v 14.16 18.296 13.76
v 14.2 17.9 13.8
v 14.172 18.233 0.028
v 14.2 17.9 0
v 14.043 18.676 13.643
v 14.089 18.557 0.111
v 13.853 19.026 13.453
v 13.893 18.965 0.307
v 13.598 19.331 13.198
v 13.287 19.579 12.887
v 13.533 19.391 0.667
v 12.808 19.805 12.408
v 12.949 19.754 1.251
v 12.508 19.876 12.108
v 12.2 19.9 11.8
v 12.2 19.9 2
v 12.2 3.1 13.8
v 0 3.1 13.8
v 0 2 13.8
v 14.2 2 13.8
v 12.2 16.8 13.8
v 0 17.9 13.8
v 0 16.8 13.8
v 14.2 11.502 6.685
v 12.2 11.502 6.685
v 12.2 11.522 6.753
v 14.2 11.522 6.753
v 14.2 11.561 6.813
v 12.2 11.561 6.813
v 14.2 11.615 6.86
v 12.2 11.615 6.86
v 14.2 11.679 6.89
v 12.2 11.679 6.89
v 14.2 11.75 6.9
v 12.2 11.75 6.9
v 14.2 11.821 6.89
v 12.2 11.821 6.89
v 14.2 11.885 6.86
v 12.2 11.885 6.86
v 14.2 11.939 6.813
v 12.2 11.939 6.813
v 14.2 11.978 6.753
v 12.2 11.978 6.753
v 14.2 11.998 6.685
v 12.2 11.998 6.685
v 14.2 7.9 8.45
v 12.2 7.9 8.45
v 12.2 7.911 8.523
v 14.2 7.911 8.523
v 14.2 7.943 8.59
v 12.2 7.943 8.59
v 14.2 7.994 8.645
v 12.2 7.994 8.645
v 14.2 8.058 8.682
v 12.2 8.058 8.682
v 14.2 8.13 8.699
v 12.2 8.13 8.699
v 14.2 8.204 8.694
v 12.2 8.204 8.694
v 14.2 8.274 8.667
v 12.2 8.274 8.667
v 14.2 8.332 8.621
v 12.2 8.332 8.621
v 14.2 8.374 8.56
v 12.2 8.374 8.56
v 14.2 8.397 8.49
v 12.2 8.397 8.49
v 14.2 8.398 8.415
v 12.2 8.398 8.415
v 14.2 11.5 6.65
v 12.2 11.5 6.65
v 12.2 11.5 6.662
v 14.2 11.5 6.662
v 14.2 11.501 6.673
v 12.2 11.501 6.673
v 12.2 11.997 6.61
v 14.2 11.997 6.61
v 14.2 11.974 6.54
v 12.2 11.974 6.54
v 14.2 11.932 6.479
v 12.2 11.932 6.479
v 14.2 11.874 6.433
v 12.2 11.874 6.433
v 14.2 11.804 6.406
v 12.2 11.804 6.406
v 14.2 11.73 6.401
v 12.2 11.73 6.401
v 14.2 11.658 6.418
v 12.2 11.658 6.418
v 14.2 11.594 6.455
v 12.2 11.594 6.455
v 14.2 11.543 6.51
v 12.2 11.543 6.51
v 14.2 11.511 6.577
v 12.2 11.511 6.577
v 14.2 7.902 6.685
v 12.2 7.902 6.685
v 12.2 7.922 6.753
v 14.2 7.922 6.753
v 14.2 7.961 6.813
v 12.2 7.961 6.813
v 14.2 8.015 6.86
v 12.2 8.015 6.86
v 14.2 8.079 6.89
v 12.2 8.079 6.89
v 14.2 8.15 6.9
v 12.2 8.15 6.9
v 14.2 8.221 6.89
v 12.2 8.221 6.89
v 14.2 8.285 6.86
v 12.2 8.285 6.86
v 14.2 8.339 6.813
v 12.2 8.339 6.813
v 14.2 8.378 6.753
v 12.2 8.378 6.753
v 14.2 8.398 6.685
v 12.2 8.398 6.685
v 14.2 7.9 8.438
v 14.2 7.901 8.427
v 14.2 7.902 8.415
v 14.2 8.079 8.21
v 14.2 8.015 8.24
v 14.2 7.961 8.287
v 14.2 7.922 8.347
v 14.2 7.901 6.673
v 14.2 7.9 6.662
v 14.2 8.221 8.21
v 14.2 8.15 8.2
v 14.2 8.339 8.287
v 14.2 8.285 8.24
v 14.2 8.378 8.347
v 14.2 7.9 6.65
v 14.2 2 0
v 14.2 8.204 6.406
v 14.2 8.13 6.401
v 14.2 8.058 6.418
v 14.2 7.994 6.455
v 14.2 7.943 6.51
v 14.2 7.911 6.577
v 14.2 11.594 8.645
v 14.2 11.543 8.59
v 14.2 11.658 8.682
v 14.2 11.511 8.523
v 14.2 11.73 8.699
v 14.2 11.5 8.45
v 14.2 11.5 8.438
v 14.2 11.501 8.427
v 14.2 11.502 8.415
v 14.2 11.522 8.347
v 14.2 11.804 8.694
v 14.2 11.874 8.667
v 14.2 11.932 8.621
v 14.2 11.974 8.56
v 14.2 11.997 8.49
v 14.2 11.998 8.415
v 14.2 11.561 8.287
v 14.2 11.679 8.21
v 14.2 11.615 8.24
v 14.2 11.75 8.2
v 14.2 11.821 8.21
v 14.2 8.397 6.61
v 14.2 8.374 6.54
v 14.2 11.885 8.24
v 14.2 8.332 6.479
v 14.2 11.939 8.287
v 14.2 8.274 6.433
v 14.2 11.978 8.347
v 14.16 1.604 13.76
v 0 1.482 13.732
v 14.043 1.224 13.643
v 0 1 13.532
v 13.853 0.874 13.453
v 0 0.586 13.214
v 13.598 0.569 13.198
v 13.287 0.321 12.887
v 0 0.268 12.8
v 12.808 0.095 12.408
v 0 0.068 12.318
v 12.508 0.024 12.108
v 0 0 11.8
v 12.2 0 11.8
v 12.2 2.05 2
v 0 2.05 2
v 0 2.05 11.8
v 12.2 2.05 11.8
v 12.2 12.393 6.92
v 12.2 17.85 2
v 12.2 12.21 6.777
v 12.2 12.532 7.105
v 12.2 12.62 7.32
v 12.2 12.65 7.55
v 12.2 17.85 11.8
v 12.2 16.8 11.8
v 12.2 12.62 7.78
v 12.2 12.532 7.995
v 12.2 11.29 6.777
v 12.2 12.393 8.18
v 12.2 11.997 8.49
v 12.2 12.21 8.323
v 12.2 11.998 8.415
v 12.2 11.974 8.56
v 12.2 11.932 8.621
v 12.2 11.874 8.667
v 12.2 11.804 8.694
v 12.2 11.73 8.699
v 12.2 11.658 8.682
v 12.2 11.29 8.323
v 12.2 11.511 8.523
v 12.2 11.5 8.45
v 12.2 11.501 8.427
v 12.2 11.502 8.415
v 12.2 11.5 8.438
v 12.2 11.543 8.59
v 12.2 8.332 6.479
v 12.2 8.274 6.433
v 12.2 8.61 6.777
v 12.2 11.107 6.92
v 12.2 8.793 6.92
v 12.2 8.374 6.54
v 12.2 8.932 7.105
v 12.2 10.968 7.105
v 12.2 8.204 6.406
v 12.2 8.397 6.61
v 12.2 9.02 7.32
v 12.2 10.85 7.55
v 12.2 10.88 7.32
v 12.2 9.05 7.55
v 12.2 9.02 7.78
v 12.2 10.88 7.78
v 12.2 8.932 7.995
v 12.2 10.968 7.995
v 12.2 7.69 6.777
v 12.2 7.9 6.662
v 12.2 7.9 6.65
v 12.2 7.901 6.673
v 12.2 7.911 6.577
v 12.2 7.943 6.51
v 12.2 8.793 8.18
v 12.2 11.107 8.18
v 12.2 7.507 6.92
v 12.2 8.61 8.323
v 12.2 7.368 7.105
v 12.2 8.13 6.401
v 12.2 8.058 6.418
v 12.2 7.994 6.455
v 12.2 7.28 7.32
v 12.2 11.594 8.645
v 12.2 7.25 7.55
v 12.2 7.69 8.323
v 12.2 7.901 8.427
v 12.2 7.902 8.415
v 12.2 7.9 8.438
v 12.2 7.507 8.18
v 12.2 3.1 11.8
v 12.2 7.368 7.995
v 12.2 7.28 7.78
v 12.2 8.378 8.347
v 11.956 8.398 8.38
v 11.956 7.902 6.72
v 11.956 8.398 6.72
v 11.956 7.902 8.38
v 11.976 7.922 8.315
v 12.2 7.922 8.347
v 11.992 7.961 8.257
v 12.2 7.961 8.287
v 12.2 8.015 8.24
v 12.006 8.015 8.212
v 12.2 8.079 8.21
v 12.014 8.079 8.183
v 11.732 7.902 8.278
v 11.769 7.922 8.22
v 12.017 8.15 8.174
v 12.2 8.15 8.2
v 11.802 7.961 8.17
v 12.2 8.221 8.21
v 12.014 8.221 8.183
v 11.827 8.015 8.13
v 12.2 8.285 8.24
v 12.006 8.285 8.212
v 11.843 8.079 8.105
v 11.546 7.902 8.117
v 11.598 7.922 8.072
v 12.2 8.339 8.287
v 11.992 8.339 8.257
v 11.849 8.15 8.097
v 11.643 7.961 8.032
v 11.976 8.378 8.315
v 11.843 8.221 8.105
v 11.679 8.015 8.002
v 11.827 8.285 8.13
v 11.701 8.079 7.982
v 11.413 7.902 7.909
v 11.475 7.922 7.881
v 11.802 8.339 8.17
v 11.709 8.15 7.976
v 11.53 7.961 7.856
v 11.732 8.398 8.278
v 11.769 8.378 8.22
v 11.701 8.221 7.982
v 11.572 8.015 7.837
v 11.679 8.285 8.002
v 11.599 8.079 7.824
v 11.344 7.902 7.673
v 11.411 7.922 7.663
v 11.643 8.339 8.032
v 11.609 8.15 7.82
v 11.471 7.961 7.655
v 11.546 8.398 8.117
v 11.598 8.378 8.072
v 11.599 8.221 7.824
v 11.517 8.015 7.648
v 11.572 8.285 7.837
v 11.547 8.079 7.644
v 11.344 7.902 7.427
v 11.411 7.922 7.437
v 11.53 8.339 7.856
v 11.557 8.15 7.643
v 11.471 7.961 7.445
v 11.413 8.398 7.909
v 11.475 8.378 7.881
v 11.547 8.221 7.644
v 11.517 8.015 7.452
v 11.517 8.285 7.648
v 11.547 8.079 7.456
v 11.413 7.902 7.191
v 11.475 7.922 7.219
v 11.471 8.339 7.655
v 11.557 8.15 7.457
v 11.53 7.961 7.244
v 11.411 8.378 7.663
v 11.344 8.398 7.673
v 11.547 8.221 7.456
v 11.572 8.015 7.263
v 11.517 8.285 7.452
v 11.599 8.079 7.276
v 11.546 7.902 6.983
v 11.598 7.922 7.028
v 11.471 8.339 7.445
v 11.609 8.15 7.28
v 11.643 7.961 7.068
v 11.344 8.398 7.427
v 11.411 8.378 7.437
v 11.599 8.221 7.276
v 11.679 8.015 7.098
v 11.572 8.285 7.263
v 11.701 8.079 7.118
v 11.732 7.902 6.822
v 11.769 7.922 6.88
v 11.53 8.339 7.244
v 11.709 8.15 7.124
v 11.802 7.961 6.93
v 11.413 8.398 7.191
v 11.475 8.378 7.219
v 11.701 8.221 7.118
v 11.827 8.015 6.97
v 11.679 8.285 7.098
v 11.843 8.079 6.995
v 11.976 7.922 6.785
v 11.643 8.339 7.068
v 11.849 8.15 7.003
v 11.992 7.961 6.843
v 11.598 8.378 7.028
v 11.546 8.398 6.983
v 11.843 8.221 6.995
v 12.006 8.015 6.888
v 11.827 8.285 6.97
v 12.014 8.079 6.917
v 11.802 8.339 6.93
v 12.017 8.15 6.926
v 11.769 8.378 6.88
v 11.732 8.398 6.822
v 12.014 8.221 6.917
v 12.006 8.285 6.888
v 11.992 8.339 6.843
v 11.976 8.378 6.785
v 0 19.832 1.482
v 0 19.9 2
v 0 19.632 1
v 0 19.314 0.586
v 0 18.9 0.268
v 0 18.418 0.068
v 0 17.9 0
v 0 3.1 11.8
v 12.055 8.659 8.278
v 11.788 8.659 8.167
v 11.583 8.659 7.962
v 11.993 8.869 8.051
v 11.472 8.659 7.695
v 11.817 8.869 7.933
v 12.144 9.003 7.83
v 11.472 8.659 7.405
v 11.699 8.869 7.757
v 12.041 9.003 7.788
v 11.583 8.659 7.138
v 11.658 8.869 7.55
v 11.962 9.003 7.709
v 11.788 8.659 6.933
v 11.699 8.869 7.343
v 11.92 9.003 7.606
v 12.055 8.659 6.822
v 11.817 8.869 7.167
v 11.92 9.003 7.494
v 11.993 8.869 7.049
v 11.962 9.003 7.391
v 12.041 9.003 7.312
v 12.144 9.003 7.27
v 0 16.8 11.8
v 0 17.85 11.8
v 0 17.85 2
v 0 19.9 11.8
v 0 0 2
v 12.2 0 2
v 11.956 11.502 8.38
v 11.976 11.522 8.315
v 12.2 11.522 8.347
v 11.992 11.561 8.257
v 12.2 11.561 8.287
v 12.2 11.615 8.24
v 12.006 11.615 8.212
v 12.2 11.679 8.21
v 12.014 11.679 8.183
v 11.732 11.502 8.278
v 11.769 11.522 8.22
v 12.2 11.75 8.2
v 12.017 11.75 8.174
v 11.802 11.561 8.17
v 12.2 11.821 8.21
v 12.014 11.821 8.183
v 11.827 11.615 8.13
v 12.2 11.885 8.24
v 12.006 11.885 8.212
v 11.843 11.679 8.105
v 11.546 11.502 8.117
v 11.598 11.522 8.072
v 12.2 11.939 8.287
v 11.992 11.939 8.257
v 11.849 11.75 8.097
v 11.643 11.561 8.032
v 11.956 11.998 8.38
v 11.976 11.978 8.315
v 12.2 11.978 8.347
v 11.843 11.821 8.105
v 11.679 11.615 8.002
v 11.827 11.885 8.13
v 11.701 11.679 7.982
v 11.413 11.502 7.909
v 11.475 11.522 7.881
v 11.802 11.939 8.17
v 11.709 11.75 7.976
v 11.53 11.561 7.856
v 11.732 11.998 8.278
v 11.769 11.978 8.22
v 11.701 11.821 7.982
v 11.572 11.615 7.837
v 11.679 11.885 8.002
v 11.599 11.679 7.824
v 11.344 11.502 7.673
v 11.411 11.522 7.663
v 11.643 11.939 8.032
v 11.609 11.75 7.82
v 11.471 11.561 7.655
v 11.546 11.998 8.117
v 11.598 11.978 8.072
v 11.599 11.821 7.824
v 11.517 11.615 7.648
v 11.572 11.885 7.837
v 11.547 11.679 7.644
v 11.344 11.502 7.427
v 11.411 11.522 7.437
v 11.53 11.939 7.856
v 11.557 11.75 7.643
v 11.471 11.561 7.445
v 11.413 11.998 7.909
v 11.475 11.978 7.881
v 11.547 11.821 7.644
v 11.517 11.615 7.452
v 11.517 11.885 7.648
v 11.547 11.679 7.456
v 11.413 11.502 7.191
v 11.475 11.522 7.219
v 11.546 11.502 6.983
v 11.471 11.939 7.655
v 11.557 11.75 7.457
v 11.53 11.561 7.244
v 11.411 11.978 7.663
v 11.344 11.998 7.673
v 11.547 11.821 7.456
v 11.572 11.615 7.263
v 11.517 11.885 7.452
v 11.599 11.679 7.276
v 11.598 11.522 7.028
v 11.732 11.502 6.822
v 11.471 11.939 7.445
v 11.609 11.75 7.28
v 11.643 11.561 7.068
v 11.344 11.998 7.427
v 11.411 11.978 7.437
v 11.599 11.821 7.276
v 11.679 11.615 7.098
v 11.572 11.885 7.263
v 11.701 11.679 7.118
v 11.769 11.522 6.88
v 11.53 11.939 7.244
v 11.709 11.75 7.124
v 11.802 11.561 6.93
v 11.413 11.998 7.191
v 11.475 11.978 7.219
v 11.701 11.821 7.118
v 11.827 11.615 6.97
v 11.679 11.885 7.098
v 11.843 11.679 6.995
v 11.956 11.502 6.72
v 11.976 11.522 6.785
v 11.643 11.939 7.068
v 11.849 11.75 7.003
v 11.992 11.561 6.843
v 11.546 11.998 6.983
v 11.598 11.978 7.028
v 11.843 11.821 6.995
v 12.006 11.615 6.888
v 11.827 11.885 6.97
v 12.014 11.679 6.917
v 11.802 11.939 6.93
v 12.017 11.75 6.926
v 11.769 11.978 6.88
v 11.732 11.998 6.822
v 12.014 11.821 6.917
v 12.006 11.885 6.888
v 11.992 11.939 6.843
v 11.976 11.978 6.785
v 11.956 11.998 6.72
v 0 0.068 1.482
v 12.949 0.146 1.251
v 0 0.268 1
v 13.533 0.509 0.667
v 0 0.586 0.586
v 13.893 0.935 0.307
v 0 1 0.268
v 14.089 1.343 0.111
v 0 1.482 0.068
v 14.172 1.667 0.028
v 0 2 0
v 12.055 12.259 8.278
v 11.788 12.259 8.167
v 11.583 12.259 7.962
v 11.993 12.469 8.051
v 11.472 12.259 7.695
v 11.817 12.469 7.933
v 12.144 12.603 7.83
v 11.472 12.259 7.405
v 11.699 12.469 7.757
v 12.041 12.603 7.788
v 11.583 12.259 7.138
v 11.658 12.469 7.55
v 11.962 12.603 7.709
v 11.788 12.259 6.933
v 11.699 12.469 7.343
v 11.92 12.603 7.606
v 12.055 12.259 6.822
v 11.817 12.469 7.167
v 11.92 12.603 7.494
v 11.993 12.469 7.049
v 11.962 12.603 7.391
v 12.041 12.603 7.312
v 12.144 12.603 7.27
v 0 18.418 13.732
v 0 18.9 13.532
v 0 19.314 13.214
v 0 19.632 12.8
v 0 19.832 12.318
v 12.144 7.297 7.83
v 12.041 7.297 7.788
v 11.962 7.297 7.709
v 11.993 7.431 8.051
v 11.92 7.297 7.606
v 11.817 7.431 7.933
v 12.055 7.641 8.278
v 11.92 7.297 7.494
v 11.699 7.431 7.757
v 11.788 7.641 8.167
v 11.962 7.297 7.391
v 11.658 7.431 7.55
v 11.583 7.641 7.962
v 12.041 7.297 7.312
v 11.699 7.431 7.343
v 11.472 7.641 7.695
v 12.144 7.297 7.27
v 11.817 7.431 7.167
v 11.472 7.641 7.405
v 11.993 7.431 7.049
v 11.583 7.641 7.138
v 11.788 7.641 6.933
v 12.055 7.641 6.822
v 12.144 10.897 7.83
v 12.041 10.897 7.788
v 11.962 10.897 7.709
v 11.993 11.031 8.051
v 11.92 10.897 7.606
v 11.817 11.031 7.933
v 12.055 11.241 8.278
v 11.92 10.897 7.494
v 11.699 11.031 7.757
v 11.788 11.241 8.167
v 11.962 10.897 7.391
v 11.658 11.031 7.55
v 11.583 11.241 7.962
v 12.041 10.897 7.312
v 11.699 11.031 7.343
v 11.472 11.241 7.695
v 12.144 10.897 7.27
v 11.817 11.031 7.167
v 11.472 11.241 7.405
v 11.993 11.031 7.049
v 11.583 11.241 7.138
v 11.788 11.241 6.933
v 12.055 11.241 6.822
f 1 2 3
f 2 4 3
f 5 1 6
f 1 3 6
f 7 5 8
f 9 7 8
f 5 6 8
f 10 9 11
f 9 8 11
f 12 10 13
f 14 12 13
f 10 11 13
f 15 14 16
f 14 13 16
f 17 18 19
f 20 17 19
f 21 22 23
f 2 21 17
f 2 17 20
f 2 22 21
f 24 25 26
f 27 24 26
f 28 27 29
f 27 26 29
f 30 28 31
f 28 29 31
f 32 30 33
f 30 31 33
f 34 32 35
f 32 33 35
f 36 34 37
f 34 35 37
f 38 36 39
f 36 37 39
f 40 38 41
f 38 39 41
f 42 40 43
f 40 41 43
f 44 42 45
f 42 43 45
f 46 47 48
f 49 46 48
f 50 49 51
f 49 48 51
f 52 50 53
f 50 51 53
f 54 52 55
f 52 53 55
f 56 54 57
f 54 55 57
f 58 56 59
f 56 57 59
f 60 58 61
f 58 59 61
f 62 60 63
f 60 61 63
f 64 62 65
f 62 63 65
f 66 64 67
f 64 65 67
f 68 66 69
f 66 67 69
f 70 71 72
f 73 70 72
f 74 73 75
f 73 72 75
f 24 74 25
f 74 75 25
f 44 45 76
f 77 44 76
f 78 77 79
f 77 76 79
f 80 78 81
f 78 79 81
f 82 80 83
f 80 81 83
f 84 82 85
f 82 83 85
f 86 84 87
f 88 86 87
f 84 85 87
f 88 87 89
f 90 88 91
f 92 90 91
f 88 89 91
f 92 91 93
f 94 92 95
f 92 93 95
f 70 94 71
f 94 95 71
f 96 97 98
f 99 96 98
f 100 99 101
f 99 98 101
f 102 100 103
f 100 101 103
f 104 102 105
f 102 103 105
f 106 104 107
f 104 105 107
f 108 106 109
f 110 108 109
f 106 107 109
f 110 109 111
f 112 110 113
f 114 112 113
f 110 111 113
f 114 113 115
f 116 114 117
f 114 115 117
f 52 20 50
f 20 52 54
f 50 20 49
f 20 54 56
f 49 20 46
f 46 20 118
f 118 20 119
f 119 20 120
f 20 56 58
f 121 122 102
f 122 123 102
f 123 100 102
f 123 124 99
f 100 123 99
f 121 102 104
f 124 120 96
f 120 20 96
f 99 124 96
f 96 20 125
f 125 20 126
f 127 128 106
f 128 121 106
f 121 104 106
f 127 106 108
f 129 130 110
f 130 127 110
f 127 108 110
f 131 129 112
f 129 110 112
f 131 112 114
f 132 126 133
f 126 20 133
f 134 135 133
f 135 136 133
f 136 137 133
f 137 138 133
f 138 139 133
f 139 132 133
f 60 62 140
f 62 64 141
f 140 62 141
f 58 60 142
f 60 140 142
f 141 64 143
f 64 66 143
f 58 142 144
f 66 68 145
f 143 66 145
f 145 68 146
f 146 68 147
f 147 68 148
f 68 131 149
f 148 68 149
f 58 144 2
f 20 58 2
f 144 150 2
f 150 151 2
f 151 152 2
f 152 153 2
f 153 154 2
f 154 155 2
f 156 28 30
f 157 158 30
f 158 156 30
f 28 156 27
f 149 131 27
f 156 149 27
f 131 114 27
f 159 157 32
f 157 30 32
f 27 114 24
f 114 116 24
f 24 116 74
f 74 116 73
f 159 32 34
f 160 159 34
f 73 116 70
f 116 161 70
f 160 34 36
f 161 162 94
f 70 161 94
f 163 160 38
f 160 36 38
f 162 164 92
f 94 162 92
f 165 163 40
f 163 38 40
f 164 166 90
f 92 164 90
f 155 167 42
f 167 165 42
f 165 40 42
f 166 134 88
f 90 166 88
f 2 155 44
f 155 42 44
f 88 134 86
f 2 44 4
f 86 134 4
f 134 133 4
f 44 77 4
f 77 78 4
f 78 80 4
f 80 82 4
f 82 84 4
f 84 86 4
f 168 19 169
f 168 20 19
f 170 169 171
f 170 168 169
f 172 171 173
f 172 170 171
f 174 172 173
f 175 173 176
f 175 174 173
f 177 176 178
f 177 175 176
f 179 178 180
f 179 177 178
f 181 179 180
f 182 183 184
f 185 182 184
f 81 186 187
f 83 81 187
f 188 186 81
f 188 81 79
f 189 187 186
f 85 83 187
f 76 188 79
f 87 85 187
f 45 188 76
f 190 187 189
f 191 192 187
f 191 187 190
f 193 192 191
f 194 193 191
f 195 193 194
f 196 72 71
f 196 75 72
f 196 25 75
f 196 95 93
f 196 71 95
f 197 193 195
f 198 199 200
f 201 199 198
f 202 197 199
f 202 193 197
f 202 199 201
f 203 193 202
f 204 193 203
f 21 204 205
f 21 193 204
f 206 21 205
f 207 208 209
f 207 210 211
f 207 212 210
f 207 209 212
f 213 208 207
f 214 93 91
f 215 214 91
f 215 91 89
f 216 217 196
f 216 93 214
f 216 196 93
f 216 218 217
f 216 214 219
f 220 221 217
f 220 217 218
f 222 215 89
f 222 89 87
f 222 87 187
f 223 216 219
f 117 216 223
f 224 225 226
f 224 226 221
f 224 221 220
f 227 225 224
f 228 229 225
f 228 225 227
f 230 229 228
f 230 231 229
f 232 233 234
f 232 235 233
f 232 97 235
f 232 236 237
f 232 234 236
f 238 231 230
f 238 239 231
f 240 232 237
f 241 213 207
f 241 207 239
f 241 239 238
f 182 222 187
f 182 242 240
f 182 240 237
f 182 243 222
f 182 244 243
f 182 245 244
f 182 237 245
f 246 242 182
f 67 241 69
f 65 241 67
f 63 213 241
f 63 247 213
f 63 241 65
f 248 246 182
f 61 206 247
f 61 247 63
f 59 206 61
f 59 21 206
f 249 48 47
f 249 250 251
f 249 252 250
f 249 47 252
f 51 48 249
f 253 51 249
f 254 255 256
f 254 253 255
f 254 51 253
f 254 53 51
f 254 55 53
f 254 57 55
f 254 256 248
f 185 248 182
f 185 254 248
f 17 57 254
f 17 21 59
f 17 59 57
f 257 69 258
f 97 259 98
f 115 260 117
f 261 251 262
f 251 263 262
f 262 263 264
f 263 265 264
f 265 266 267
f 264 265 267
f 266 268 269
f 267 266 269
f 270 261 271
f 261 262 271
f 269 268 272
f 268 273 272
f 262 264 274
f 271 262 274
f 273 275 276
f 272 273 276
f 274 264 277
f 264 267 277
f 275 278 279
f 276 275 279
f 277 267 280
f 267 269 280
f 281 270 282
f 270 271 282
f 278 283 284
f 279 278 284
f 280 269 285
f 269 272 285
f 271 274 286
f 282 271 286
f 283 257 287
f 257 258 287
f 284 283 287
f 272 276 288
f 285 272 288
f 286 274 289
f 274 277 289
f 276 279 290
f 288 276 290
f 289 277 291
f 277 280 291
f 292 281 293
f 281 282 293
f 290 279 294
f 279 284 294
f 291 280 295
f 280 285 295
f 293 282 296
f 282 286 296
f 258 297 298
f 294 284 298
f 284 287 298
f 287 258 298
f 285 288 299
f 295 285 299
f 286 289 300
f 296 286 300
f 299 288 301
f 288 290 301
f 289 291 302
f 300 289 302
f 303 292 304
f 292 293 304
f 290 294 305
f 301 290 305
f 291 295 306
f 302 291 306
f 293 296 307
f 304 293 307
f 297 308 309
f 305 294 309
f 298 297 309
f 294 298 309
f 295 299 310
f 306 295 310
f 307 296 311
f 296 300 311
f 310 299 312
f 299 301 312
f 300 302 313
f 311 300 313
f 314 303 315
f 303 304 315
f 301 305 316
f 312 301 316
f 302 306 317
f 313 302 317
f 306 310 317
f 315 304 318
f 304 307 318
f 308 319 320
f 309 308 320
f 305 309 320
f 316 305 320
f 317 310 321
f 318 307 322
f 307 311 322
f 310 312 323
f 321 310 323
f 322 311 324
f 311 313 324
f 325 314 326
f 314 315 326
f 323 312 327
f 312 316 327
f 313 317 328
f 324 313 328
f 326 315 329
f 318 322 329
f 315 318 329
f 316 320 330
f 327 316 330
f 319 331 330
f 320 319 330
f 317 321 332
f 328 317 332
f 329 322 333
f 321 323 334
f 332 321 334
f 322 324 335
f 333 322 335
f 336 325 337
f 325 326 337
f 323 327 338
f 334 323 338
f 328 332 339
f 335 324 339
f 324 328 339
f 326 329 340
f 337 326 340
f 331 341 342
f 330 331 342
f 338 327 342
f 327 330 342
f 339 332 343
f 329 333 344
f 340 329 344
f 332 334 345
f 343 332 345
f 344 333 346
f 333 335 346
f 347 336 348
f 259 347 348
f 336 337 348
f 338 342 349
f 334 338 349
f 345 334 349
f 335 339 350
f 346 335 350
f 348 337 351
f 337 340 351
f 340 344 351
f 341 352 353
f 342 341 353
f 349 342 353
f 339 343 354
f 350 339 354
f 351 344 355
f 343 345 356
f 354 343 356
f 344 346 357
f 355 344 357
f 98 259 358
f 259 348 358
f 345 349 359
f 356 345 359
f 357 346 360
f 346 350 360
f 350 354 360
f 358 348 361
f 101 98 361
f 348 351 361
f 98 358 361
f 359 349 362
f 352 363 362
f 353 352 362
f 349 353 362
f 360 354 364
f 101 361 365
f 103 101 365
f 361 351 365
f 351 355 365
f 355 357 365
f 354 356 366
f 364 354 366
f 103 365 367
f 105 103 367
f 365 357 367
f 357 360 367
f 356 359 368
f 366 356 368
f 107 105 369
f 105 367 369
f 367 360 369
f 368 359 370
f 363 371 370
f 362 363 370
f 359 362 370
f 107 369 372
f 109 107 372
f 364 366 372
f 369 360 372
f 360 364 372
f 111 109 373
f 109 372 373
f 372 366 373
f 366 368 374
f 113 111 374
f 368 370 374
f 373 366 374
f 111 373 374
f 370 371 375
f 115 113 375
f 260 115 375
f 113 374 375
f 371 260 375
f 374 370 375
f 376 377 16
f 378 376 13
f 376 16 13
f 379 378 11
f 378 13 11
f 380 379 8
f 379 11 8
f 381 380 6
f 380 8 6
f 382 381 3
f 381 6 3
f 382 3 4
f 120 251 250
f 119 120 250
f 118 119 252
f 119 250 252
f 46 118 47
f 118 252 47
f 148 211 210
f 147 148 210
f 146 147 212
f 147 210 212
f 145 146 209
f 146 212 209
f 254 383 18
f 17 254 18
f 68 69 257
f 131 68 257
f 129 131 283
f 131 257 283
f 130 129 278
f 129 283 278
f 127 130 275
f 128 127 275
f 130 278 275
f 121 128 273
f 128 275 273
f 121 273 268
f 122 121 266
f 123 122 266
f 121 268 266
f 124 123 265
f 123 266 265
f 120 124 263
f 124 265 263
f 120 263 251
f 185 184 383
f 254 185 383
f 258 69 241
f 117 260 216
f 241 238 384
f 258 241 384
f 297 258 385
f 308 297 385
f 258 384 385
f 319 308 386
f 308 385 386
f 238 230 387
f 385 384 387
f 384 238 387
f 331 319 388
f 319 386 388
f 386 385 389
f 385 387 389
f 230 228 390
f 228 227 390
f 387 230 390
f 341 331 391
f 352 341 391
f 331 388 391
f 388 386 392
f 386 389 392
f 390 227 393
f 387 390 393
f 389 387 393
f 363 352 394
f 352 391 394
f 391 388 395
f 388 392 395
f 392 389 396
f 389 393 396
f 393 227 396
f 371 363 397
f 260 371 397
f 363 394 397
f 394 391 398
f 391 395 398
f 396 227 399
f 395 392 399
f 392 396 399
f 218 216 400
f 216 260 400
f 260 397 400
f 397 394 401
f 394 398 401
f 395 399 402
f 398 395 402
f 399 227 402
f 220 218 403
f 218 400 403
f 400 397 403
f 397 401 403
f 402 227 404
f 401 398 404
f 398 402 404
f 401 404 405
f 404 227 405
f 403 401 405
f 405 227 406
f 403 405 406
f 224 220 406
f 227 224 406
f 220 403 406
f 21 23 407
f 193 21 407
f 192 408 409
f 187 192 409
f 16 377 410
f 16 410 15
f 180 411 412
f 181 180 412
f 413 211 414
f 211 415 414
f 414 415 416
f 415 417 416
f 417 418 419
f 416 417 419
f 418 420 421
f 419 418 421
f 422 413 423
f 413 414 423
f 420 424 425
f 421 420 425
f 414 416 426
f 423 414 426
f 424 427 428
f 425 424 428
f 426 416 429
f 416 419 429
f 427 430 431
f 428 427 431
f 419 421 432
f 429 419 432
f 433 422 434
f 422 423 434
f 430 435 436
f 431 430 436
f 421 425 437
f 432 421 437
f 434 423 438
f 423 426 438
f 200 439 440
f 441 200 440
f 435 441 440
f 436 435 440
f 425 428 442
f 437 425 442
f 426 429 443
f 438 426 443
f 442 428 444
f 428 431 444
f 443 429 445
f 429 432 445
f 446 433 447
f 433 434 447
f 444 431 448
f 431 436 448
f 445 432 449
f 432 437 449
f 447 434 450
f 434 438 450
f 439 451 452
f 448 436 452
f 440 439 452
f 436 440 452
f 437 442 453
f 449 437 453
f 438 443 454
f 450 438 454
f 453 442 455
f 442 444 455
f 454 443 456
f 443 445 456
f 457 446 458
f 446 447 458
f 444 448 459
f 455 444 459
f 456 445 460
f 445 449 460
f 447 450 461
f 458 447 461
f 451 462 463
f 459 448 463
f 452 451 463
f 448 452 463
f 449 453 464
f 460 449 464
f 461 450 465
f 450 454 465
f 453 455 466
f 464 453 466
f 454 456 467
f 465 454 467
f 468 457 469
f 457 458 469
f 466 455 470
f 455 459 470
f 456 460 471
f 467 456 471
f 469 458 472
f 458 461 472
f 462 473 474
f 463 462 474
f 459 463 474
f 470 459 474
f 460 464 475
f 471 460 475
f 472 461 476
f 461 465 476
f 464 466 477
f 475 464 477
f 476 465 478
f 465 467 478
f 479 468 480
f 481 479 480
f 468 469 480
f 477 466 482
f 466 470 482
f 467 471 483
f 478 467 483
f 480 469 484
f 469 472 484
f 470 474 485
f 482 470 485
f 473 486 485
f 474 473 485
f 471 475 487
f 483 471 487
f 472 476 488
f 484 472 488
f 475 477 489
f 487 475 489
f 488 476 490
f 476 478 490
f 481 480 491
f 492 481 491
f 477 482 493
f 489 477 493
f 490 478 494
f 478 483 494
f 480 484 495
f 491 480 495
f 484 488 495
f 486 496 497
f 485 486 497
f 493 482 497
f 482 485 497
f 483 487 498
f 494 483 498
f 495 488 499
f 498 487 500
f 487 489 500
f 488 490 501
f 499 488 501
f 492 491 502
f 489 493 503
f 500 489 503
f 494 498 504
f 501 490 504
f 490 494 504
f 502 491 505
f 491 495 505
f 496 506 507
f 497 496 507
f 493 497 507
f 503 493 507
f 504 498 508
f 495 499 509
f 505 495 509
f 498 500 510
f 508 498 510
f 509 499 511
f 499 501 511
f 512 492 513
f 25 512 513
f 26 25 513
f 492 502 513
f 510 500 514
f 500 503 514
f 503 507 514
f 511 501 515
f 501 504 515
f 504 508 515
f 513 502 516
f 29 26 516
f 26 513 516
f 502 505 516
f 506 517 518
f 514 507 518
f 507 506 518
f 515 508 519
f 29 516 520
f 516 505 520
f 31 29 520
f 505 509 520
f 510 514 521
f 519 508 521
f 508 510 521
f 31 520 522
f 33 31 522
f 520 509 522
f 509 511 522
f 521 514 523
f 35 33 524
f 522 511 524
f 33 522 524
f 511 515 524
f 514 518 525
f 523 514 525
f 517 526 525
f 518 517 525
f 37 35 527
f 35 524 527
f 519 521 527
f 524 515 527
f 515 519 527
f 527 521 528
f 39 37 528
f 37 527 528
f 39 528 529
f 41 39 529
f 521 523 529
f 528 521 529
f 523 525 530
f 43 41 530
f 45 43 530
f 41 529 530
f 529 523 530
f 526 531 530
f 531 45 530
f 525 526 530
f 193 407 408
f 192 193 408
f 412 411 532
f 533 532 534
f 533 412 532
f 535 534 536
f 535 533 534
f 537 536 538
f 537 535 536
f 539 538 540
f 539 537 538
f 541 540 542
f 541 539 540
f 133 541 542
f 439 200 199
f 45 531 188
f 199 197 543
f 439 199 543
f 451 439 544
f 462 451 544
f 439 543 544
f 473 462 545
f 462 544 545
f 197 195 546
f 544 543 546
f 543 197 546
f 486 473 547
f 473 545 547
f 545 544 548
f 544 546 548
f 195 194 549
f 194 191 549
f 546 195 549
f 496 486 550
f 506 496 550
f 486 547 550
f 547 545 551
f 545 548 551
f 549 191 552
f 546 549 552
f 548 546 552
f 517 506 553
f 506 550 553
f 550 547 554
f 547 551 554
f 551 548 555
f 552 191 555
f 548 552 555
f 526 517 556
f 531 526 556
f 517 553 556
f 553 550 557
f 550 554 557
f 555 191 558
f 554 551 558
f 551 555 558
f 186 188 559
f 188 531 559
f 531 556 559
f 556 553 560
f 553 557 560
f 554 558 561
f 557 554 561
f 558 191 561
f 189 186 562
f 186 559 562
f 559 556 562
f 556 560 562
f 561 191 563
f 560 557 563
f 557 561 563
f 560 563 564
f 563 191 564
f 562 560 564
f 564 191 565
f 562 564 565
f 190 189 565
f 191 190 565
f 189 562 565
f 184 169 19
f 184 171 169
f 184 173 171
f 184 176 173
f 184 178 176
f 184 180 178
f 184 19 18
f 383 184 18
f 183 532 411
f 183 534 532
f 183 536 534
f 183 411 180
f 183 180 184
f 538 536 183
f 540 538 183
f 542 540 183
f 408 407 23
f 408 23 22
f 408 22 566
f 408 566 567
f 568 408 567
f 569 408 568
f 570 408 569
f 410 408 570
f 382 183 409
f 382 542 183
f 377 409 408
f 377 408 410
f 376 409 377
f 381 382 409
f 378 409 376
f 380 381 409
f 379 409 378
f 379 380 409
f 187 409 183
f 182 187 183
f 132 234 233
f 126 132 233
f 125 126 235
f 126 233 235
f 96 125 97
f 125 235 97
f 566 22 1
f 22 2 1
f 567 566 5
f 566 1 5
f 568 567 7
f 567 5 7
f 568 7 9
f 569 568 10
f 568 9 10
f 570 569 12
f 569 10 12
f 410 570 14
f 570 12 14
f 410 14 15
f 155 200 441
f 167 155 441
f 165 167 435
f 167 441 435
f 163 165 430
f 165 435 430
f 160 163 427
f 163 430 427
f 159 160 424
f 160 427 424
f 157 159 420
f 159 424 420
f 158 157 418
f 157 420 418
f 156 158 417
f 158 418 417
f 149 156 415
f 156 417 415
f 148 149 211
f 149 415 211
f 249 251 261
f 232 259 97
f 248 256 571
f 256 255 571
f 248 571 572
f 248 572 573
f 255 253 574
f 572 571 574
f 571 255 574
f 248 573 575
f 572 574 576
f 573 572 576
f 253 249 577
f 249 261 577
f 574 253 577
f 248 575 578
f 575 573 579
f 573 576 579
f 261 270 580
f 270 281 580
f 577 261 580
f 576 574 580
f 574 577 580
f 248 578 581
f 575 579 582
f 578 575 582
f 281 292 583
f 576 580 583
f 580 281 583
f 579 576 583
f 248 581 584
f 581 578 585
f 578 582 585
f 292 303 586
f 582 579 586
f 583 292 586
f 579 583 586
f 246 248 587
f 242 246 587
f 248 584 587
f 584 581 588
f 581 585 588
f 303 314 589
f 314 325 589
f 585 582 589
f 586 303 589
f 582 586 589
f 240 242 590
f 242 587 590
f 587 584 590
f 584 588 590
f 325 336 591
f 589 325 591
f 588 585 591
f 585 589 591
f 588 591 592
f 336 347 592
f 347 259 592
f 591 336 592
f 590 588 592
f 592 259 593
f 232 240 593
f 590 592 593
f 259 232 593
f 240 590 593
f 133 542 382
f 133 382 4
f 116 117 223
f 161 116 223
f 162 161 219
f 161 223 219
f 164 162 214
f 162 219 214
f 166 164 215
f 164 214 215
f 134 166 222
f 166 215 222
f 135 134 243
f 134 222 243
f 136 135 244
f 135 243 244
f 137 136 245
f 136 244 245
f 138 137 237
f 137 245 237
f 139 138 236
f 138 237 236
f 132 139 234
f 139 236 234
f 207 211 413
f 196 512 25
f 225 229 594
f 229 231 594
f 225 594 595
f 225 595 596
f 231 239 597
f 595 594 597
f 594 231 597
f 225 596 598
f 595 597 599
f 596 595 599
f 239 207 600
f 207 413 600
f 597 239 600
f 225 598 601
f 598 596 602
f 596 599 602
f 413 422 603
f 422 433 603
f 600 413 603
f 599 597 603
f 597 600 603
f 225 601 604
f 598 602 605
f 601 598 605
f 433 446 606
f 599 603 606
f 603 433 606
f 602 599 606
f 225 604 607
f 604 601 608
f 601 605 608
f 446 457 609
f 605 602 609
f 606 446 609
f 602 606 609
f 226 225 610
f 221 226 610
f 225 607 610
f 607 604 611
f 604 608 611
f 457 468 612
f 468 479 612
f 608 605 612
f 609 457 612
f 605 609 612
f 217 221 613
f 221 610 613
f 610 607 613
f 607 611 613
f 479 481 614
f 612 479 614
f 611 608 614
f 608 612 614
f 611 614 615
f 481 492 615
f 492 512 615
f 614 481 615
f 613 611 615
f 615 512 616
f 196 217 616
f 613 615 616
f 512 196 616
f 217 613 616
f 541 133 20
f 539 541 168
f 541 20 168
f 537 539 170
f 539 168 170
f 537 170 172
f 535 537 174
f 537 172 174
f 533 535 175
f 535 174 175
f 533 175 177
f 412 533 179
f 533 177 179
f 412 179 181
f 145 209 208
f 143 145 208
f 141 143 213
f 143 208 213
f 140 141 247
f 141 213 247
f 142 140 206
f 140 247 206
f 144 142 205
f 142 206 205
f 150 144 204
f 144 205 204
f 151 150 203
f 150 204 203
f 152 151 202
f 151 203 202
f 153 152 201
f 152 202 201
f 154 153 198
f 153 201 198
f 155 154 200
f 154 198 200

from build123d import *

# Parameters (mm, degrees)
F0_W     = 14.2
F0_H     = 19.9
F1_DEPTH = 13.8
F2_DEPTH = 12
F4_DEPTH = 12.2
F6_DEPTH = 2.001
F7_ANGLE = 180
F8_R     = 2


with BuildPart() as f1:
    # F0 (on Top) → F1 (new body)
    with BuildSketch(Plane.XY):
        with Locations((7.1, 9.95)):
            Rectangle(F0_W, F0_H)
    extrude(amount=F1_DEPTH)

    # F0 (on Top) → F2 (join)
    with BuildSketch(Plane.XY):
        with Locations((7.1, 9.95)):
            Rectangle(F0_W, F0_H)
    extrude(amount=F2_DEPTH)

    # F3 (on face) → F4 (cut)
    with BuildSketch(Plane(origin=(0, 0, 0), x_dir=(0, -1, 0), z_dir=(-1, 0, 0))):
        Polygon((-3.1, 13.8), (-16.8, 13.8), (-16.8, 11.8), (-17.85, 11.8), (-17.85, 2), (-2.05, 2), (-2.05, 11.8), (-3.1, 11.8), align=None)
    extrude(amount=-F4_DEPTH, mode=Mode.SUBTRACT)

    # F5 (on face) → F6 (cut, through all)
    with BuildSketch(Plane(origin=(12.2, 0, 0), x_dir=(0, -1, 0), z_dir=(-1, 0, 0))):
        with BuildLine():
            ThreePointArc((-11.9975769926, 8.4152777778), (-11.75, 8.2), (-11.5024230074, 8.4152777778))
            ThreePointArc((-11.5024230074, 8.4152777778), (-11.75, 8.45), (-11.9975769926, 8.4152777778))
        make_face()
        with BuildLine():
            ThreePointArc((-11.9975769926, 8.4152777778), (-11.75, 8.45), (-11.5024230074, 8.4152777778))
            ThreePointArc((-11.5024230074, 8.4152777778), (-11.5006064875, 8.4325966693), (-11.5, 8.45))
            ThreePointArc((-11.5, 8.45), (-11.7674033307, 8.6993935125), (-11.9975769926, 8.4152777778))
        make_face()
        with BuildLine():
            ThreePointArc((-8.3975769926, 8.4152777778), (-8.15, 8.2), (-7.9024230074, 8.4152777778))
            ThreePointArc((-7.9024230074, 8.4152777778), (-8.15, 8.45), (-8.3975769926, 8.4152777778))
        make_face()
        with BuildLine():
            ThreePointArc((-8.3975769926, 8.4152777778), (-8.15, 8.45), (-7.9024230074, 8.4152777778))
            ThreePointArc((-7.9024230074, 8.4152777778), (-7.9006064875, 8.4325966693), (-7.9, 8.45))
            ThreePointArc((-7.9, 8.45), (-8.1674033307, 8.6993935125), (-8.3975769926, 8.4152777778))
        make_face()
        with BuildLine():
            ThreePointArc((-8.3975769926, 6.6847222222), (-8.15, 6.65), (-7.9024230074, 6.6847222222))
            ThreePointArc((-7.9024230074, 6.6847222222), (-8.15, 6.9), (-8.3975769926, 6.6847222222))
        make_face()
        with BuildLine():
            ThreePointArc((-7.9, 6.65), (-7.9006064875, 6.6674033307), (-7.9024230074, 6.6847222222))
            ThreePointArc((-7.9024230074, 6.6847222222), (-8.15, 6.65), (-8.3975769926, 6.6847222222))
            ThreePointArc((-8.3975769926, 6.6847222222), (-8.1674033307, 6.4006064875), (-7.9, 6.65))
        make_face()
        with BuildLine():
            ThreePointArc((-11.9975769926, 6.6847222222), (-11.75, 6.65), (-11.5024230074, 6.6847222222))
            ThreePointArc((-11.5024230074, 6.6847222222), (-11.75, 6.9), (-11.9975769926, 6.6847222222))
        make_face()
        with BuildLine():
            ThreePointArc((-11.5, 6.65), (-11.5006064875, 6.6674033307), (-11.5024230074, 6.6847222222))
            ThreePointArc((-11.5024230074, 6.6847222222), (-11.75, 6.65), (-11.9975769926, 6.6847222222))
            ThreePointArc((-11.9975769926, 6.6847222222), (-11.7674033307, 6.4006064875), (-11.5, 6.65))
        make_face()
    extrude(amount=-F6_DEPTH, mode=Mode.SUBTRACT)

    # F5 (on face) → F7 (revolve)
    with BuildSketch(Plane(origin=(12.2, 0, 0), x_dir=(0, -1, 0), z_dir=(-1, 0, 0))):
        with BuildLine():
            Line((-12.65, 7.55), (-10.85, 7.55))
            ThreePointArc((-10.85, 7.55), (-11.0313835191, 8.0918397856), (-11.5024230074, 8.4152777778))
            ThreePointArc((-11.5024230074, 8.4152777778), (-11.75, 8.2), (-11.9975769926, 8.4152777778))
            ThreePointArc((-11.9975769926, 8.4152777778), (-12.4686164809, 8.0918397856), (-12.65, 7.55))
        make_face()
        with BuildLine():
            Line((-9.05, 7.55), (-7.25, 7.55))
            ThreePointArc((-7.25, 7.55), (-7.4313835191, 8.0918397856), (-7.9024230074, 8.4152777778))
            ThreePointArc((-7.9024230074, 8.4152777778), (-8.15, 8.2), (-8.3975769926, 8.4152777778))
            ThreePointArc((-8.3975769926, 8.4152777778), (-8.8686164809, 8.0918397856), (-9.05, 7.55))
        make_face()
    revolve(axis=Axis((12.2, 11.75, 7.55), (0, -1, 0)), revolution_arc=F7_ANGLE)

    # F8
    f8_edges = [f1.edges().sort_by_distance(p)[0] for p in [
        (7.1, 0, 0),
        (7.1, 19.9, 0),
        (7.1, 19.9, 13.8),
        (7.1, 0, 13.8),
        (14.2, 0, 6.9),
        (14.2, 19.9, 6.9),
    ]]
    fillet(f8_edges, radius=F8_R)


solid = f1.part
